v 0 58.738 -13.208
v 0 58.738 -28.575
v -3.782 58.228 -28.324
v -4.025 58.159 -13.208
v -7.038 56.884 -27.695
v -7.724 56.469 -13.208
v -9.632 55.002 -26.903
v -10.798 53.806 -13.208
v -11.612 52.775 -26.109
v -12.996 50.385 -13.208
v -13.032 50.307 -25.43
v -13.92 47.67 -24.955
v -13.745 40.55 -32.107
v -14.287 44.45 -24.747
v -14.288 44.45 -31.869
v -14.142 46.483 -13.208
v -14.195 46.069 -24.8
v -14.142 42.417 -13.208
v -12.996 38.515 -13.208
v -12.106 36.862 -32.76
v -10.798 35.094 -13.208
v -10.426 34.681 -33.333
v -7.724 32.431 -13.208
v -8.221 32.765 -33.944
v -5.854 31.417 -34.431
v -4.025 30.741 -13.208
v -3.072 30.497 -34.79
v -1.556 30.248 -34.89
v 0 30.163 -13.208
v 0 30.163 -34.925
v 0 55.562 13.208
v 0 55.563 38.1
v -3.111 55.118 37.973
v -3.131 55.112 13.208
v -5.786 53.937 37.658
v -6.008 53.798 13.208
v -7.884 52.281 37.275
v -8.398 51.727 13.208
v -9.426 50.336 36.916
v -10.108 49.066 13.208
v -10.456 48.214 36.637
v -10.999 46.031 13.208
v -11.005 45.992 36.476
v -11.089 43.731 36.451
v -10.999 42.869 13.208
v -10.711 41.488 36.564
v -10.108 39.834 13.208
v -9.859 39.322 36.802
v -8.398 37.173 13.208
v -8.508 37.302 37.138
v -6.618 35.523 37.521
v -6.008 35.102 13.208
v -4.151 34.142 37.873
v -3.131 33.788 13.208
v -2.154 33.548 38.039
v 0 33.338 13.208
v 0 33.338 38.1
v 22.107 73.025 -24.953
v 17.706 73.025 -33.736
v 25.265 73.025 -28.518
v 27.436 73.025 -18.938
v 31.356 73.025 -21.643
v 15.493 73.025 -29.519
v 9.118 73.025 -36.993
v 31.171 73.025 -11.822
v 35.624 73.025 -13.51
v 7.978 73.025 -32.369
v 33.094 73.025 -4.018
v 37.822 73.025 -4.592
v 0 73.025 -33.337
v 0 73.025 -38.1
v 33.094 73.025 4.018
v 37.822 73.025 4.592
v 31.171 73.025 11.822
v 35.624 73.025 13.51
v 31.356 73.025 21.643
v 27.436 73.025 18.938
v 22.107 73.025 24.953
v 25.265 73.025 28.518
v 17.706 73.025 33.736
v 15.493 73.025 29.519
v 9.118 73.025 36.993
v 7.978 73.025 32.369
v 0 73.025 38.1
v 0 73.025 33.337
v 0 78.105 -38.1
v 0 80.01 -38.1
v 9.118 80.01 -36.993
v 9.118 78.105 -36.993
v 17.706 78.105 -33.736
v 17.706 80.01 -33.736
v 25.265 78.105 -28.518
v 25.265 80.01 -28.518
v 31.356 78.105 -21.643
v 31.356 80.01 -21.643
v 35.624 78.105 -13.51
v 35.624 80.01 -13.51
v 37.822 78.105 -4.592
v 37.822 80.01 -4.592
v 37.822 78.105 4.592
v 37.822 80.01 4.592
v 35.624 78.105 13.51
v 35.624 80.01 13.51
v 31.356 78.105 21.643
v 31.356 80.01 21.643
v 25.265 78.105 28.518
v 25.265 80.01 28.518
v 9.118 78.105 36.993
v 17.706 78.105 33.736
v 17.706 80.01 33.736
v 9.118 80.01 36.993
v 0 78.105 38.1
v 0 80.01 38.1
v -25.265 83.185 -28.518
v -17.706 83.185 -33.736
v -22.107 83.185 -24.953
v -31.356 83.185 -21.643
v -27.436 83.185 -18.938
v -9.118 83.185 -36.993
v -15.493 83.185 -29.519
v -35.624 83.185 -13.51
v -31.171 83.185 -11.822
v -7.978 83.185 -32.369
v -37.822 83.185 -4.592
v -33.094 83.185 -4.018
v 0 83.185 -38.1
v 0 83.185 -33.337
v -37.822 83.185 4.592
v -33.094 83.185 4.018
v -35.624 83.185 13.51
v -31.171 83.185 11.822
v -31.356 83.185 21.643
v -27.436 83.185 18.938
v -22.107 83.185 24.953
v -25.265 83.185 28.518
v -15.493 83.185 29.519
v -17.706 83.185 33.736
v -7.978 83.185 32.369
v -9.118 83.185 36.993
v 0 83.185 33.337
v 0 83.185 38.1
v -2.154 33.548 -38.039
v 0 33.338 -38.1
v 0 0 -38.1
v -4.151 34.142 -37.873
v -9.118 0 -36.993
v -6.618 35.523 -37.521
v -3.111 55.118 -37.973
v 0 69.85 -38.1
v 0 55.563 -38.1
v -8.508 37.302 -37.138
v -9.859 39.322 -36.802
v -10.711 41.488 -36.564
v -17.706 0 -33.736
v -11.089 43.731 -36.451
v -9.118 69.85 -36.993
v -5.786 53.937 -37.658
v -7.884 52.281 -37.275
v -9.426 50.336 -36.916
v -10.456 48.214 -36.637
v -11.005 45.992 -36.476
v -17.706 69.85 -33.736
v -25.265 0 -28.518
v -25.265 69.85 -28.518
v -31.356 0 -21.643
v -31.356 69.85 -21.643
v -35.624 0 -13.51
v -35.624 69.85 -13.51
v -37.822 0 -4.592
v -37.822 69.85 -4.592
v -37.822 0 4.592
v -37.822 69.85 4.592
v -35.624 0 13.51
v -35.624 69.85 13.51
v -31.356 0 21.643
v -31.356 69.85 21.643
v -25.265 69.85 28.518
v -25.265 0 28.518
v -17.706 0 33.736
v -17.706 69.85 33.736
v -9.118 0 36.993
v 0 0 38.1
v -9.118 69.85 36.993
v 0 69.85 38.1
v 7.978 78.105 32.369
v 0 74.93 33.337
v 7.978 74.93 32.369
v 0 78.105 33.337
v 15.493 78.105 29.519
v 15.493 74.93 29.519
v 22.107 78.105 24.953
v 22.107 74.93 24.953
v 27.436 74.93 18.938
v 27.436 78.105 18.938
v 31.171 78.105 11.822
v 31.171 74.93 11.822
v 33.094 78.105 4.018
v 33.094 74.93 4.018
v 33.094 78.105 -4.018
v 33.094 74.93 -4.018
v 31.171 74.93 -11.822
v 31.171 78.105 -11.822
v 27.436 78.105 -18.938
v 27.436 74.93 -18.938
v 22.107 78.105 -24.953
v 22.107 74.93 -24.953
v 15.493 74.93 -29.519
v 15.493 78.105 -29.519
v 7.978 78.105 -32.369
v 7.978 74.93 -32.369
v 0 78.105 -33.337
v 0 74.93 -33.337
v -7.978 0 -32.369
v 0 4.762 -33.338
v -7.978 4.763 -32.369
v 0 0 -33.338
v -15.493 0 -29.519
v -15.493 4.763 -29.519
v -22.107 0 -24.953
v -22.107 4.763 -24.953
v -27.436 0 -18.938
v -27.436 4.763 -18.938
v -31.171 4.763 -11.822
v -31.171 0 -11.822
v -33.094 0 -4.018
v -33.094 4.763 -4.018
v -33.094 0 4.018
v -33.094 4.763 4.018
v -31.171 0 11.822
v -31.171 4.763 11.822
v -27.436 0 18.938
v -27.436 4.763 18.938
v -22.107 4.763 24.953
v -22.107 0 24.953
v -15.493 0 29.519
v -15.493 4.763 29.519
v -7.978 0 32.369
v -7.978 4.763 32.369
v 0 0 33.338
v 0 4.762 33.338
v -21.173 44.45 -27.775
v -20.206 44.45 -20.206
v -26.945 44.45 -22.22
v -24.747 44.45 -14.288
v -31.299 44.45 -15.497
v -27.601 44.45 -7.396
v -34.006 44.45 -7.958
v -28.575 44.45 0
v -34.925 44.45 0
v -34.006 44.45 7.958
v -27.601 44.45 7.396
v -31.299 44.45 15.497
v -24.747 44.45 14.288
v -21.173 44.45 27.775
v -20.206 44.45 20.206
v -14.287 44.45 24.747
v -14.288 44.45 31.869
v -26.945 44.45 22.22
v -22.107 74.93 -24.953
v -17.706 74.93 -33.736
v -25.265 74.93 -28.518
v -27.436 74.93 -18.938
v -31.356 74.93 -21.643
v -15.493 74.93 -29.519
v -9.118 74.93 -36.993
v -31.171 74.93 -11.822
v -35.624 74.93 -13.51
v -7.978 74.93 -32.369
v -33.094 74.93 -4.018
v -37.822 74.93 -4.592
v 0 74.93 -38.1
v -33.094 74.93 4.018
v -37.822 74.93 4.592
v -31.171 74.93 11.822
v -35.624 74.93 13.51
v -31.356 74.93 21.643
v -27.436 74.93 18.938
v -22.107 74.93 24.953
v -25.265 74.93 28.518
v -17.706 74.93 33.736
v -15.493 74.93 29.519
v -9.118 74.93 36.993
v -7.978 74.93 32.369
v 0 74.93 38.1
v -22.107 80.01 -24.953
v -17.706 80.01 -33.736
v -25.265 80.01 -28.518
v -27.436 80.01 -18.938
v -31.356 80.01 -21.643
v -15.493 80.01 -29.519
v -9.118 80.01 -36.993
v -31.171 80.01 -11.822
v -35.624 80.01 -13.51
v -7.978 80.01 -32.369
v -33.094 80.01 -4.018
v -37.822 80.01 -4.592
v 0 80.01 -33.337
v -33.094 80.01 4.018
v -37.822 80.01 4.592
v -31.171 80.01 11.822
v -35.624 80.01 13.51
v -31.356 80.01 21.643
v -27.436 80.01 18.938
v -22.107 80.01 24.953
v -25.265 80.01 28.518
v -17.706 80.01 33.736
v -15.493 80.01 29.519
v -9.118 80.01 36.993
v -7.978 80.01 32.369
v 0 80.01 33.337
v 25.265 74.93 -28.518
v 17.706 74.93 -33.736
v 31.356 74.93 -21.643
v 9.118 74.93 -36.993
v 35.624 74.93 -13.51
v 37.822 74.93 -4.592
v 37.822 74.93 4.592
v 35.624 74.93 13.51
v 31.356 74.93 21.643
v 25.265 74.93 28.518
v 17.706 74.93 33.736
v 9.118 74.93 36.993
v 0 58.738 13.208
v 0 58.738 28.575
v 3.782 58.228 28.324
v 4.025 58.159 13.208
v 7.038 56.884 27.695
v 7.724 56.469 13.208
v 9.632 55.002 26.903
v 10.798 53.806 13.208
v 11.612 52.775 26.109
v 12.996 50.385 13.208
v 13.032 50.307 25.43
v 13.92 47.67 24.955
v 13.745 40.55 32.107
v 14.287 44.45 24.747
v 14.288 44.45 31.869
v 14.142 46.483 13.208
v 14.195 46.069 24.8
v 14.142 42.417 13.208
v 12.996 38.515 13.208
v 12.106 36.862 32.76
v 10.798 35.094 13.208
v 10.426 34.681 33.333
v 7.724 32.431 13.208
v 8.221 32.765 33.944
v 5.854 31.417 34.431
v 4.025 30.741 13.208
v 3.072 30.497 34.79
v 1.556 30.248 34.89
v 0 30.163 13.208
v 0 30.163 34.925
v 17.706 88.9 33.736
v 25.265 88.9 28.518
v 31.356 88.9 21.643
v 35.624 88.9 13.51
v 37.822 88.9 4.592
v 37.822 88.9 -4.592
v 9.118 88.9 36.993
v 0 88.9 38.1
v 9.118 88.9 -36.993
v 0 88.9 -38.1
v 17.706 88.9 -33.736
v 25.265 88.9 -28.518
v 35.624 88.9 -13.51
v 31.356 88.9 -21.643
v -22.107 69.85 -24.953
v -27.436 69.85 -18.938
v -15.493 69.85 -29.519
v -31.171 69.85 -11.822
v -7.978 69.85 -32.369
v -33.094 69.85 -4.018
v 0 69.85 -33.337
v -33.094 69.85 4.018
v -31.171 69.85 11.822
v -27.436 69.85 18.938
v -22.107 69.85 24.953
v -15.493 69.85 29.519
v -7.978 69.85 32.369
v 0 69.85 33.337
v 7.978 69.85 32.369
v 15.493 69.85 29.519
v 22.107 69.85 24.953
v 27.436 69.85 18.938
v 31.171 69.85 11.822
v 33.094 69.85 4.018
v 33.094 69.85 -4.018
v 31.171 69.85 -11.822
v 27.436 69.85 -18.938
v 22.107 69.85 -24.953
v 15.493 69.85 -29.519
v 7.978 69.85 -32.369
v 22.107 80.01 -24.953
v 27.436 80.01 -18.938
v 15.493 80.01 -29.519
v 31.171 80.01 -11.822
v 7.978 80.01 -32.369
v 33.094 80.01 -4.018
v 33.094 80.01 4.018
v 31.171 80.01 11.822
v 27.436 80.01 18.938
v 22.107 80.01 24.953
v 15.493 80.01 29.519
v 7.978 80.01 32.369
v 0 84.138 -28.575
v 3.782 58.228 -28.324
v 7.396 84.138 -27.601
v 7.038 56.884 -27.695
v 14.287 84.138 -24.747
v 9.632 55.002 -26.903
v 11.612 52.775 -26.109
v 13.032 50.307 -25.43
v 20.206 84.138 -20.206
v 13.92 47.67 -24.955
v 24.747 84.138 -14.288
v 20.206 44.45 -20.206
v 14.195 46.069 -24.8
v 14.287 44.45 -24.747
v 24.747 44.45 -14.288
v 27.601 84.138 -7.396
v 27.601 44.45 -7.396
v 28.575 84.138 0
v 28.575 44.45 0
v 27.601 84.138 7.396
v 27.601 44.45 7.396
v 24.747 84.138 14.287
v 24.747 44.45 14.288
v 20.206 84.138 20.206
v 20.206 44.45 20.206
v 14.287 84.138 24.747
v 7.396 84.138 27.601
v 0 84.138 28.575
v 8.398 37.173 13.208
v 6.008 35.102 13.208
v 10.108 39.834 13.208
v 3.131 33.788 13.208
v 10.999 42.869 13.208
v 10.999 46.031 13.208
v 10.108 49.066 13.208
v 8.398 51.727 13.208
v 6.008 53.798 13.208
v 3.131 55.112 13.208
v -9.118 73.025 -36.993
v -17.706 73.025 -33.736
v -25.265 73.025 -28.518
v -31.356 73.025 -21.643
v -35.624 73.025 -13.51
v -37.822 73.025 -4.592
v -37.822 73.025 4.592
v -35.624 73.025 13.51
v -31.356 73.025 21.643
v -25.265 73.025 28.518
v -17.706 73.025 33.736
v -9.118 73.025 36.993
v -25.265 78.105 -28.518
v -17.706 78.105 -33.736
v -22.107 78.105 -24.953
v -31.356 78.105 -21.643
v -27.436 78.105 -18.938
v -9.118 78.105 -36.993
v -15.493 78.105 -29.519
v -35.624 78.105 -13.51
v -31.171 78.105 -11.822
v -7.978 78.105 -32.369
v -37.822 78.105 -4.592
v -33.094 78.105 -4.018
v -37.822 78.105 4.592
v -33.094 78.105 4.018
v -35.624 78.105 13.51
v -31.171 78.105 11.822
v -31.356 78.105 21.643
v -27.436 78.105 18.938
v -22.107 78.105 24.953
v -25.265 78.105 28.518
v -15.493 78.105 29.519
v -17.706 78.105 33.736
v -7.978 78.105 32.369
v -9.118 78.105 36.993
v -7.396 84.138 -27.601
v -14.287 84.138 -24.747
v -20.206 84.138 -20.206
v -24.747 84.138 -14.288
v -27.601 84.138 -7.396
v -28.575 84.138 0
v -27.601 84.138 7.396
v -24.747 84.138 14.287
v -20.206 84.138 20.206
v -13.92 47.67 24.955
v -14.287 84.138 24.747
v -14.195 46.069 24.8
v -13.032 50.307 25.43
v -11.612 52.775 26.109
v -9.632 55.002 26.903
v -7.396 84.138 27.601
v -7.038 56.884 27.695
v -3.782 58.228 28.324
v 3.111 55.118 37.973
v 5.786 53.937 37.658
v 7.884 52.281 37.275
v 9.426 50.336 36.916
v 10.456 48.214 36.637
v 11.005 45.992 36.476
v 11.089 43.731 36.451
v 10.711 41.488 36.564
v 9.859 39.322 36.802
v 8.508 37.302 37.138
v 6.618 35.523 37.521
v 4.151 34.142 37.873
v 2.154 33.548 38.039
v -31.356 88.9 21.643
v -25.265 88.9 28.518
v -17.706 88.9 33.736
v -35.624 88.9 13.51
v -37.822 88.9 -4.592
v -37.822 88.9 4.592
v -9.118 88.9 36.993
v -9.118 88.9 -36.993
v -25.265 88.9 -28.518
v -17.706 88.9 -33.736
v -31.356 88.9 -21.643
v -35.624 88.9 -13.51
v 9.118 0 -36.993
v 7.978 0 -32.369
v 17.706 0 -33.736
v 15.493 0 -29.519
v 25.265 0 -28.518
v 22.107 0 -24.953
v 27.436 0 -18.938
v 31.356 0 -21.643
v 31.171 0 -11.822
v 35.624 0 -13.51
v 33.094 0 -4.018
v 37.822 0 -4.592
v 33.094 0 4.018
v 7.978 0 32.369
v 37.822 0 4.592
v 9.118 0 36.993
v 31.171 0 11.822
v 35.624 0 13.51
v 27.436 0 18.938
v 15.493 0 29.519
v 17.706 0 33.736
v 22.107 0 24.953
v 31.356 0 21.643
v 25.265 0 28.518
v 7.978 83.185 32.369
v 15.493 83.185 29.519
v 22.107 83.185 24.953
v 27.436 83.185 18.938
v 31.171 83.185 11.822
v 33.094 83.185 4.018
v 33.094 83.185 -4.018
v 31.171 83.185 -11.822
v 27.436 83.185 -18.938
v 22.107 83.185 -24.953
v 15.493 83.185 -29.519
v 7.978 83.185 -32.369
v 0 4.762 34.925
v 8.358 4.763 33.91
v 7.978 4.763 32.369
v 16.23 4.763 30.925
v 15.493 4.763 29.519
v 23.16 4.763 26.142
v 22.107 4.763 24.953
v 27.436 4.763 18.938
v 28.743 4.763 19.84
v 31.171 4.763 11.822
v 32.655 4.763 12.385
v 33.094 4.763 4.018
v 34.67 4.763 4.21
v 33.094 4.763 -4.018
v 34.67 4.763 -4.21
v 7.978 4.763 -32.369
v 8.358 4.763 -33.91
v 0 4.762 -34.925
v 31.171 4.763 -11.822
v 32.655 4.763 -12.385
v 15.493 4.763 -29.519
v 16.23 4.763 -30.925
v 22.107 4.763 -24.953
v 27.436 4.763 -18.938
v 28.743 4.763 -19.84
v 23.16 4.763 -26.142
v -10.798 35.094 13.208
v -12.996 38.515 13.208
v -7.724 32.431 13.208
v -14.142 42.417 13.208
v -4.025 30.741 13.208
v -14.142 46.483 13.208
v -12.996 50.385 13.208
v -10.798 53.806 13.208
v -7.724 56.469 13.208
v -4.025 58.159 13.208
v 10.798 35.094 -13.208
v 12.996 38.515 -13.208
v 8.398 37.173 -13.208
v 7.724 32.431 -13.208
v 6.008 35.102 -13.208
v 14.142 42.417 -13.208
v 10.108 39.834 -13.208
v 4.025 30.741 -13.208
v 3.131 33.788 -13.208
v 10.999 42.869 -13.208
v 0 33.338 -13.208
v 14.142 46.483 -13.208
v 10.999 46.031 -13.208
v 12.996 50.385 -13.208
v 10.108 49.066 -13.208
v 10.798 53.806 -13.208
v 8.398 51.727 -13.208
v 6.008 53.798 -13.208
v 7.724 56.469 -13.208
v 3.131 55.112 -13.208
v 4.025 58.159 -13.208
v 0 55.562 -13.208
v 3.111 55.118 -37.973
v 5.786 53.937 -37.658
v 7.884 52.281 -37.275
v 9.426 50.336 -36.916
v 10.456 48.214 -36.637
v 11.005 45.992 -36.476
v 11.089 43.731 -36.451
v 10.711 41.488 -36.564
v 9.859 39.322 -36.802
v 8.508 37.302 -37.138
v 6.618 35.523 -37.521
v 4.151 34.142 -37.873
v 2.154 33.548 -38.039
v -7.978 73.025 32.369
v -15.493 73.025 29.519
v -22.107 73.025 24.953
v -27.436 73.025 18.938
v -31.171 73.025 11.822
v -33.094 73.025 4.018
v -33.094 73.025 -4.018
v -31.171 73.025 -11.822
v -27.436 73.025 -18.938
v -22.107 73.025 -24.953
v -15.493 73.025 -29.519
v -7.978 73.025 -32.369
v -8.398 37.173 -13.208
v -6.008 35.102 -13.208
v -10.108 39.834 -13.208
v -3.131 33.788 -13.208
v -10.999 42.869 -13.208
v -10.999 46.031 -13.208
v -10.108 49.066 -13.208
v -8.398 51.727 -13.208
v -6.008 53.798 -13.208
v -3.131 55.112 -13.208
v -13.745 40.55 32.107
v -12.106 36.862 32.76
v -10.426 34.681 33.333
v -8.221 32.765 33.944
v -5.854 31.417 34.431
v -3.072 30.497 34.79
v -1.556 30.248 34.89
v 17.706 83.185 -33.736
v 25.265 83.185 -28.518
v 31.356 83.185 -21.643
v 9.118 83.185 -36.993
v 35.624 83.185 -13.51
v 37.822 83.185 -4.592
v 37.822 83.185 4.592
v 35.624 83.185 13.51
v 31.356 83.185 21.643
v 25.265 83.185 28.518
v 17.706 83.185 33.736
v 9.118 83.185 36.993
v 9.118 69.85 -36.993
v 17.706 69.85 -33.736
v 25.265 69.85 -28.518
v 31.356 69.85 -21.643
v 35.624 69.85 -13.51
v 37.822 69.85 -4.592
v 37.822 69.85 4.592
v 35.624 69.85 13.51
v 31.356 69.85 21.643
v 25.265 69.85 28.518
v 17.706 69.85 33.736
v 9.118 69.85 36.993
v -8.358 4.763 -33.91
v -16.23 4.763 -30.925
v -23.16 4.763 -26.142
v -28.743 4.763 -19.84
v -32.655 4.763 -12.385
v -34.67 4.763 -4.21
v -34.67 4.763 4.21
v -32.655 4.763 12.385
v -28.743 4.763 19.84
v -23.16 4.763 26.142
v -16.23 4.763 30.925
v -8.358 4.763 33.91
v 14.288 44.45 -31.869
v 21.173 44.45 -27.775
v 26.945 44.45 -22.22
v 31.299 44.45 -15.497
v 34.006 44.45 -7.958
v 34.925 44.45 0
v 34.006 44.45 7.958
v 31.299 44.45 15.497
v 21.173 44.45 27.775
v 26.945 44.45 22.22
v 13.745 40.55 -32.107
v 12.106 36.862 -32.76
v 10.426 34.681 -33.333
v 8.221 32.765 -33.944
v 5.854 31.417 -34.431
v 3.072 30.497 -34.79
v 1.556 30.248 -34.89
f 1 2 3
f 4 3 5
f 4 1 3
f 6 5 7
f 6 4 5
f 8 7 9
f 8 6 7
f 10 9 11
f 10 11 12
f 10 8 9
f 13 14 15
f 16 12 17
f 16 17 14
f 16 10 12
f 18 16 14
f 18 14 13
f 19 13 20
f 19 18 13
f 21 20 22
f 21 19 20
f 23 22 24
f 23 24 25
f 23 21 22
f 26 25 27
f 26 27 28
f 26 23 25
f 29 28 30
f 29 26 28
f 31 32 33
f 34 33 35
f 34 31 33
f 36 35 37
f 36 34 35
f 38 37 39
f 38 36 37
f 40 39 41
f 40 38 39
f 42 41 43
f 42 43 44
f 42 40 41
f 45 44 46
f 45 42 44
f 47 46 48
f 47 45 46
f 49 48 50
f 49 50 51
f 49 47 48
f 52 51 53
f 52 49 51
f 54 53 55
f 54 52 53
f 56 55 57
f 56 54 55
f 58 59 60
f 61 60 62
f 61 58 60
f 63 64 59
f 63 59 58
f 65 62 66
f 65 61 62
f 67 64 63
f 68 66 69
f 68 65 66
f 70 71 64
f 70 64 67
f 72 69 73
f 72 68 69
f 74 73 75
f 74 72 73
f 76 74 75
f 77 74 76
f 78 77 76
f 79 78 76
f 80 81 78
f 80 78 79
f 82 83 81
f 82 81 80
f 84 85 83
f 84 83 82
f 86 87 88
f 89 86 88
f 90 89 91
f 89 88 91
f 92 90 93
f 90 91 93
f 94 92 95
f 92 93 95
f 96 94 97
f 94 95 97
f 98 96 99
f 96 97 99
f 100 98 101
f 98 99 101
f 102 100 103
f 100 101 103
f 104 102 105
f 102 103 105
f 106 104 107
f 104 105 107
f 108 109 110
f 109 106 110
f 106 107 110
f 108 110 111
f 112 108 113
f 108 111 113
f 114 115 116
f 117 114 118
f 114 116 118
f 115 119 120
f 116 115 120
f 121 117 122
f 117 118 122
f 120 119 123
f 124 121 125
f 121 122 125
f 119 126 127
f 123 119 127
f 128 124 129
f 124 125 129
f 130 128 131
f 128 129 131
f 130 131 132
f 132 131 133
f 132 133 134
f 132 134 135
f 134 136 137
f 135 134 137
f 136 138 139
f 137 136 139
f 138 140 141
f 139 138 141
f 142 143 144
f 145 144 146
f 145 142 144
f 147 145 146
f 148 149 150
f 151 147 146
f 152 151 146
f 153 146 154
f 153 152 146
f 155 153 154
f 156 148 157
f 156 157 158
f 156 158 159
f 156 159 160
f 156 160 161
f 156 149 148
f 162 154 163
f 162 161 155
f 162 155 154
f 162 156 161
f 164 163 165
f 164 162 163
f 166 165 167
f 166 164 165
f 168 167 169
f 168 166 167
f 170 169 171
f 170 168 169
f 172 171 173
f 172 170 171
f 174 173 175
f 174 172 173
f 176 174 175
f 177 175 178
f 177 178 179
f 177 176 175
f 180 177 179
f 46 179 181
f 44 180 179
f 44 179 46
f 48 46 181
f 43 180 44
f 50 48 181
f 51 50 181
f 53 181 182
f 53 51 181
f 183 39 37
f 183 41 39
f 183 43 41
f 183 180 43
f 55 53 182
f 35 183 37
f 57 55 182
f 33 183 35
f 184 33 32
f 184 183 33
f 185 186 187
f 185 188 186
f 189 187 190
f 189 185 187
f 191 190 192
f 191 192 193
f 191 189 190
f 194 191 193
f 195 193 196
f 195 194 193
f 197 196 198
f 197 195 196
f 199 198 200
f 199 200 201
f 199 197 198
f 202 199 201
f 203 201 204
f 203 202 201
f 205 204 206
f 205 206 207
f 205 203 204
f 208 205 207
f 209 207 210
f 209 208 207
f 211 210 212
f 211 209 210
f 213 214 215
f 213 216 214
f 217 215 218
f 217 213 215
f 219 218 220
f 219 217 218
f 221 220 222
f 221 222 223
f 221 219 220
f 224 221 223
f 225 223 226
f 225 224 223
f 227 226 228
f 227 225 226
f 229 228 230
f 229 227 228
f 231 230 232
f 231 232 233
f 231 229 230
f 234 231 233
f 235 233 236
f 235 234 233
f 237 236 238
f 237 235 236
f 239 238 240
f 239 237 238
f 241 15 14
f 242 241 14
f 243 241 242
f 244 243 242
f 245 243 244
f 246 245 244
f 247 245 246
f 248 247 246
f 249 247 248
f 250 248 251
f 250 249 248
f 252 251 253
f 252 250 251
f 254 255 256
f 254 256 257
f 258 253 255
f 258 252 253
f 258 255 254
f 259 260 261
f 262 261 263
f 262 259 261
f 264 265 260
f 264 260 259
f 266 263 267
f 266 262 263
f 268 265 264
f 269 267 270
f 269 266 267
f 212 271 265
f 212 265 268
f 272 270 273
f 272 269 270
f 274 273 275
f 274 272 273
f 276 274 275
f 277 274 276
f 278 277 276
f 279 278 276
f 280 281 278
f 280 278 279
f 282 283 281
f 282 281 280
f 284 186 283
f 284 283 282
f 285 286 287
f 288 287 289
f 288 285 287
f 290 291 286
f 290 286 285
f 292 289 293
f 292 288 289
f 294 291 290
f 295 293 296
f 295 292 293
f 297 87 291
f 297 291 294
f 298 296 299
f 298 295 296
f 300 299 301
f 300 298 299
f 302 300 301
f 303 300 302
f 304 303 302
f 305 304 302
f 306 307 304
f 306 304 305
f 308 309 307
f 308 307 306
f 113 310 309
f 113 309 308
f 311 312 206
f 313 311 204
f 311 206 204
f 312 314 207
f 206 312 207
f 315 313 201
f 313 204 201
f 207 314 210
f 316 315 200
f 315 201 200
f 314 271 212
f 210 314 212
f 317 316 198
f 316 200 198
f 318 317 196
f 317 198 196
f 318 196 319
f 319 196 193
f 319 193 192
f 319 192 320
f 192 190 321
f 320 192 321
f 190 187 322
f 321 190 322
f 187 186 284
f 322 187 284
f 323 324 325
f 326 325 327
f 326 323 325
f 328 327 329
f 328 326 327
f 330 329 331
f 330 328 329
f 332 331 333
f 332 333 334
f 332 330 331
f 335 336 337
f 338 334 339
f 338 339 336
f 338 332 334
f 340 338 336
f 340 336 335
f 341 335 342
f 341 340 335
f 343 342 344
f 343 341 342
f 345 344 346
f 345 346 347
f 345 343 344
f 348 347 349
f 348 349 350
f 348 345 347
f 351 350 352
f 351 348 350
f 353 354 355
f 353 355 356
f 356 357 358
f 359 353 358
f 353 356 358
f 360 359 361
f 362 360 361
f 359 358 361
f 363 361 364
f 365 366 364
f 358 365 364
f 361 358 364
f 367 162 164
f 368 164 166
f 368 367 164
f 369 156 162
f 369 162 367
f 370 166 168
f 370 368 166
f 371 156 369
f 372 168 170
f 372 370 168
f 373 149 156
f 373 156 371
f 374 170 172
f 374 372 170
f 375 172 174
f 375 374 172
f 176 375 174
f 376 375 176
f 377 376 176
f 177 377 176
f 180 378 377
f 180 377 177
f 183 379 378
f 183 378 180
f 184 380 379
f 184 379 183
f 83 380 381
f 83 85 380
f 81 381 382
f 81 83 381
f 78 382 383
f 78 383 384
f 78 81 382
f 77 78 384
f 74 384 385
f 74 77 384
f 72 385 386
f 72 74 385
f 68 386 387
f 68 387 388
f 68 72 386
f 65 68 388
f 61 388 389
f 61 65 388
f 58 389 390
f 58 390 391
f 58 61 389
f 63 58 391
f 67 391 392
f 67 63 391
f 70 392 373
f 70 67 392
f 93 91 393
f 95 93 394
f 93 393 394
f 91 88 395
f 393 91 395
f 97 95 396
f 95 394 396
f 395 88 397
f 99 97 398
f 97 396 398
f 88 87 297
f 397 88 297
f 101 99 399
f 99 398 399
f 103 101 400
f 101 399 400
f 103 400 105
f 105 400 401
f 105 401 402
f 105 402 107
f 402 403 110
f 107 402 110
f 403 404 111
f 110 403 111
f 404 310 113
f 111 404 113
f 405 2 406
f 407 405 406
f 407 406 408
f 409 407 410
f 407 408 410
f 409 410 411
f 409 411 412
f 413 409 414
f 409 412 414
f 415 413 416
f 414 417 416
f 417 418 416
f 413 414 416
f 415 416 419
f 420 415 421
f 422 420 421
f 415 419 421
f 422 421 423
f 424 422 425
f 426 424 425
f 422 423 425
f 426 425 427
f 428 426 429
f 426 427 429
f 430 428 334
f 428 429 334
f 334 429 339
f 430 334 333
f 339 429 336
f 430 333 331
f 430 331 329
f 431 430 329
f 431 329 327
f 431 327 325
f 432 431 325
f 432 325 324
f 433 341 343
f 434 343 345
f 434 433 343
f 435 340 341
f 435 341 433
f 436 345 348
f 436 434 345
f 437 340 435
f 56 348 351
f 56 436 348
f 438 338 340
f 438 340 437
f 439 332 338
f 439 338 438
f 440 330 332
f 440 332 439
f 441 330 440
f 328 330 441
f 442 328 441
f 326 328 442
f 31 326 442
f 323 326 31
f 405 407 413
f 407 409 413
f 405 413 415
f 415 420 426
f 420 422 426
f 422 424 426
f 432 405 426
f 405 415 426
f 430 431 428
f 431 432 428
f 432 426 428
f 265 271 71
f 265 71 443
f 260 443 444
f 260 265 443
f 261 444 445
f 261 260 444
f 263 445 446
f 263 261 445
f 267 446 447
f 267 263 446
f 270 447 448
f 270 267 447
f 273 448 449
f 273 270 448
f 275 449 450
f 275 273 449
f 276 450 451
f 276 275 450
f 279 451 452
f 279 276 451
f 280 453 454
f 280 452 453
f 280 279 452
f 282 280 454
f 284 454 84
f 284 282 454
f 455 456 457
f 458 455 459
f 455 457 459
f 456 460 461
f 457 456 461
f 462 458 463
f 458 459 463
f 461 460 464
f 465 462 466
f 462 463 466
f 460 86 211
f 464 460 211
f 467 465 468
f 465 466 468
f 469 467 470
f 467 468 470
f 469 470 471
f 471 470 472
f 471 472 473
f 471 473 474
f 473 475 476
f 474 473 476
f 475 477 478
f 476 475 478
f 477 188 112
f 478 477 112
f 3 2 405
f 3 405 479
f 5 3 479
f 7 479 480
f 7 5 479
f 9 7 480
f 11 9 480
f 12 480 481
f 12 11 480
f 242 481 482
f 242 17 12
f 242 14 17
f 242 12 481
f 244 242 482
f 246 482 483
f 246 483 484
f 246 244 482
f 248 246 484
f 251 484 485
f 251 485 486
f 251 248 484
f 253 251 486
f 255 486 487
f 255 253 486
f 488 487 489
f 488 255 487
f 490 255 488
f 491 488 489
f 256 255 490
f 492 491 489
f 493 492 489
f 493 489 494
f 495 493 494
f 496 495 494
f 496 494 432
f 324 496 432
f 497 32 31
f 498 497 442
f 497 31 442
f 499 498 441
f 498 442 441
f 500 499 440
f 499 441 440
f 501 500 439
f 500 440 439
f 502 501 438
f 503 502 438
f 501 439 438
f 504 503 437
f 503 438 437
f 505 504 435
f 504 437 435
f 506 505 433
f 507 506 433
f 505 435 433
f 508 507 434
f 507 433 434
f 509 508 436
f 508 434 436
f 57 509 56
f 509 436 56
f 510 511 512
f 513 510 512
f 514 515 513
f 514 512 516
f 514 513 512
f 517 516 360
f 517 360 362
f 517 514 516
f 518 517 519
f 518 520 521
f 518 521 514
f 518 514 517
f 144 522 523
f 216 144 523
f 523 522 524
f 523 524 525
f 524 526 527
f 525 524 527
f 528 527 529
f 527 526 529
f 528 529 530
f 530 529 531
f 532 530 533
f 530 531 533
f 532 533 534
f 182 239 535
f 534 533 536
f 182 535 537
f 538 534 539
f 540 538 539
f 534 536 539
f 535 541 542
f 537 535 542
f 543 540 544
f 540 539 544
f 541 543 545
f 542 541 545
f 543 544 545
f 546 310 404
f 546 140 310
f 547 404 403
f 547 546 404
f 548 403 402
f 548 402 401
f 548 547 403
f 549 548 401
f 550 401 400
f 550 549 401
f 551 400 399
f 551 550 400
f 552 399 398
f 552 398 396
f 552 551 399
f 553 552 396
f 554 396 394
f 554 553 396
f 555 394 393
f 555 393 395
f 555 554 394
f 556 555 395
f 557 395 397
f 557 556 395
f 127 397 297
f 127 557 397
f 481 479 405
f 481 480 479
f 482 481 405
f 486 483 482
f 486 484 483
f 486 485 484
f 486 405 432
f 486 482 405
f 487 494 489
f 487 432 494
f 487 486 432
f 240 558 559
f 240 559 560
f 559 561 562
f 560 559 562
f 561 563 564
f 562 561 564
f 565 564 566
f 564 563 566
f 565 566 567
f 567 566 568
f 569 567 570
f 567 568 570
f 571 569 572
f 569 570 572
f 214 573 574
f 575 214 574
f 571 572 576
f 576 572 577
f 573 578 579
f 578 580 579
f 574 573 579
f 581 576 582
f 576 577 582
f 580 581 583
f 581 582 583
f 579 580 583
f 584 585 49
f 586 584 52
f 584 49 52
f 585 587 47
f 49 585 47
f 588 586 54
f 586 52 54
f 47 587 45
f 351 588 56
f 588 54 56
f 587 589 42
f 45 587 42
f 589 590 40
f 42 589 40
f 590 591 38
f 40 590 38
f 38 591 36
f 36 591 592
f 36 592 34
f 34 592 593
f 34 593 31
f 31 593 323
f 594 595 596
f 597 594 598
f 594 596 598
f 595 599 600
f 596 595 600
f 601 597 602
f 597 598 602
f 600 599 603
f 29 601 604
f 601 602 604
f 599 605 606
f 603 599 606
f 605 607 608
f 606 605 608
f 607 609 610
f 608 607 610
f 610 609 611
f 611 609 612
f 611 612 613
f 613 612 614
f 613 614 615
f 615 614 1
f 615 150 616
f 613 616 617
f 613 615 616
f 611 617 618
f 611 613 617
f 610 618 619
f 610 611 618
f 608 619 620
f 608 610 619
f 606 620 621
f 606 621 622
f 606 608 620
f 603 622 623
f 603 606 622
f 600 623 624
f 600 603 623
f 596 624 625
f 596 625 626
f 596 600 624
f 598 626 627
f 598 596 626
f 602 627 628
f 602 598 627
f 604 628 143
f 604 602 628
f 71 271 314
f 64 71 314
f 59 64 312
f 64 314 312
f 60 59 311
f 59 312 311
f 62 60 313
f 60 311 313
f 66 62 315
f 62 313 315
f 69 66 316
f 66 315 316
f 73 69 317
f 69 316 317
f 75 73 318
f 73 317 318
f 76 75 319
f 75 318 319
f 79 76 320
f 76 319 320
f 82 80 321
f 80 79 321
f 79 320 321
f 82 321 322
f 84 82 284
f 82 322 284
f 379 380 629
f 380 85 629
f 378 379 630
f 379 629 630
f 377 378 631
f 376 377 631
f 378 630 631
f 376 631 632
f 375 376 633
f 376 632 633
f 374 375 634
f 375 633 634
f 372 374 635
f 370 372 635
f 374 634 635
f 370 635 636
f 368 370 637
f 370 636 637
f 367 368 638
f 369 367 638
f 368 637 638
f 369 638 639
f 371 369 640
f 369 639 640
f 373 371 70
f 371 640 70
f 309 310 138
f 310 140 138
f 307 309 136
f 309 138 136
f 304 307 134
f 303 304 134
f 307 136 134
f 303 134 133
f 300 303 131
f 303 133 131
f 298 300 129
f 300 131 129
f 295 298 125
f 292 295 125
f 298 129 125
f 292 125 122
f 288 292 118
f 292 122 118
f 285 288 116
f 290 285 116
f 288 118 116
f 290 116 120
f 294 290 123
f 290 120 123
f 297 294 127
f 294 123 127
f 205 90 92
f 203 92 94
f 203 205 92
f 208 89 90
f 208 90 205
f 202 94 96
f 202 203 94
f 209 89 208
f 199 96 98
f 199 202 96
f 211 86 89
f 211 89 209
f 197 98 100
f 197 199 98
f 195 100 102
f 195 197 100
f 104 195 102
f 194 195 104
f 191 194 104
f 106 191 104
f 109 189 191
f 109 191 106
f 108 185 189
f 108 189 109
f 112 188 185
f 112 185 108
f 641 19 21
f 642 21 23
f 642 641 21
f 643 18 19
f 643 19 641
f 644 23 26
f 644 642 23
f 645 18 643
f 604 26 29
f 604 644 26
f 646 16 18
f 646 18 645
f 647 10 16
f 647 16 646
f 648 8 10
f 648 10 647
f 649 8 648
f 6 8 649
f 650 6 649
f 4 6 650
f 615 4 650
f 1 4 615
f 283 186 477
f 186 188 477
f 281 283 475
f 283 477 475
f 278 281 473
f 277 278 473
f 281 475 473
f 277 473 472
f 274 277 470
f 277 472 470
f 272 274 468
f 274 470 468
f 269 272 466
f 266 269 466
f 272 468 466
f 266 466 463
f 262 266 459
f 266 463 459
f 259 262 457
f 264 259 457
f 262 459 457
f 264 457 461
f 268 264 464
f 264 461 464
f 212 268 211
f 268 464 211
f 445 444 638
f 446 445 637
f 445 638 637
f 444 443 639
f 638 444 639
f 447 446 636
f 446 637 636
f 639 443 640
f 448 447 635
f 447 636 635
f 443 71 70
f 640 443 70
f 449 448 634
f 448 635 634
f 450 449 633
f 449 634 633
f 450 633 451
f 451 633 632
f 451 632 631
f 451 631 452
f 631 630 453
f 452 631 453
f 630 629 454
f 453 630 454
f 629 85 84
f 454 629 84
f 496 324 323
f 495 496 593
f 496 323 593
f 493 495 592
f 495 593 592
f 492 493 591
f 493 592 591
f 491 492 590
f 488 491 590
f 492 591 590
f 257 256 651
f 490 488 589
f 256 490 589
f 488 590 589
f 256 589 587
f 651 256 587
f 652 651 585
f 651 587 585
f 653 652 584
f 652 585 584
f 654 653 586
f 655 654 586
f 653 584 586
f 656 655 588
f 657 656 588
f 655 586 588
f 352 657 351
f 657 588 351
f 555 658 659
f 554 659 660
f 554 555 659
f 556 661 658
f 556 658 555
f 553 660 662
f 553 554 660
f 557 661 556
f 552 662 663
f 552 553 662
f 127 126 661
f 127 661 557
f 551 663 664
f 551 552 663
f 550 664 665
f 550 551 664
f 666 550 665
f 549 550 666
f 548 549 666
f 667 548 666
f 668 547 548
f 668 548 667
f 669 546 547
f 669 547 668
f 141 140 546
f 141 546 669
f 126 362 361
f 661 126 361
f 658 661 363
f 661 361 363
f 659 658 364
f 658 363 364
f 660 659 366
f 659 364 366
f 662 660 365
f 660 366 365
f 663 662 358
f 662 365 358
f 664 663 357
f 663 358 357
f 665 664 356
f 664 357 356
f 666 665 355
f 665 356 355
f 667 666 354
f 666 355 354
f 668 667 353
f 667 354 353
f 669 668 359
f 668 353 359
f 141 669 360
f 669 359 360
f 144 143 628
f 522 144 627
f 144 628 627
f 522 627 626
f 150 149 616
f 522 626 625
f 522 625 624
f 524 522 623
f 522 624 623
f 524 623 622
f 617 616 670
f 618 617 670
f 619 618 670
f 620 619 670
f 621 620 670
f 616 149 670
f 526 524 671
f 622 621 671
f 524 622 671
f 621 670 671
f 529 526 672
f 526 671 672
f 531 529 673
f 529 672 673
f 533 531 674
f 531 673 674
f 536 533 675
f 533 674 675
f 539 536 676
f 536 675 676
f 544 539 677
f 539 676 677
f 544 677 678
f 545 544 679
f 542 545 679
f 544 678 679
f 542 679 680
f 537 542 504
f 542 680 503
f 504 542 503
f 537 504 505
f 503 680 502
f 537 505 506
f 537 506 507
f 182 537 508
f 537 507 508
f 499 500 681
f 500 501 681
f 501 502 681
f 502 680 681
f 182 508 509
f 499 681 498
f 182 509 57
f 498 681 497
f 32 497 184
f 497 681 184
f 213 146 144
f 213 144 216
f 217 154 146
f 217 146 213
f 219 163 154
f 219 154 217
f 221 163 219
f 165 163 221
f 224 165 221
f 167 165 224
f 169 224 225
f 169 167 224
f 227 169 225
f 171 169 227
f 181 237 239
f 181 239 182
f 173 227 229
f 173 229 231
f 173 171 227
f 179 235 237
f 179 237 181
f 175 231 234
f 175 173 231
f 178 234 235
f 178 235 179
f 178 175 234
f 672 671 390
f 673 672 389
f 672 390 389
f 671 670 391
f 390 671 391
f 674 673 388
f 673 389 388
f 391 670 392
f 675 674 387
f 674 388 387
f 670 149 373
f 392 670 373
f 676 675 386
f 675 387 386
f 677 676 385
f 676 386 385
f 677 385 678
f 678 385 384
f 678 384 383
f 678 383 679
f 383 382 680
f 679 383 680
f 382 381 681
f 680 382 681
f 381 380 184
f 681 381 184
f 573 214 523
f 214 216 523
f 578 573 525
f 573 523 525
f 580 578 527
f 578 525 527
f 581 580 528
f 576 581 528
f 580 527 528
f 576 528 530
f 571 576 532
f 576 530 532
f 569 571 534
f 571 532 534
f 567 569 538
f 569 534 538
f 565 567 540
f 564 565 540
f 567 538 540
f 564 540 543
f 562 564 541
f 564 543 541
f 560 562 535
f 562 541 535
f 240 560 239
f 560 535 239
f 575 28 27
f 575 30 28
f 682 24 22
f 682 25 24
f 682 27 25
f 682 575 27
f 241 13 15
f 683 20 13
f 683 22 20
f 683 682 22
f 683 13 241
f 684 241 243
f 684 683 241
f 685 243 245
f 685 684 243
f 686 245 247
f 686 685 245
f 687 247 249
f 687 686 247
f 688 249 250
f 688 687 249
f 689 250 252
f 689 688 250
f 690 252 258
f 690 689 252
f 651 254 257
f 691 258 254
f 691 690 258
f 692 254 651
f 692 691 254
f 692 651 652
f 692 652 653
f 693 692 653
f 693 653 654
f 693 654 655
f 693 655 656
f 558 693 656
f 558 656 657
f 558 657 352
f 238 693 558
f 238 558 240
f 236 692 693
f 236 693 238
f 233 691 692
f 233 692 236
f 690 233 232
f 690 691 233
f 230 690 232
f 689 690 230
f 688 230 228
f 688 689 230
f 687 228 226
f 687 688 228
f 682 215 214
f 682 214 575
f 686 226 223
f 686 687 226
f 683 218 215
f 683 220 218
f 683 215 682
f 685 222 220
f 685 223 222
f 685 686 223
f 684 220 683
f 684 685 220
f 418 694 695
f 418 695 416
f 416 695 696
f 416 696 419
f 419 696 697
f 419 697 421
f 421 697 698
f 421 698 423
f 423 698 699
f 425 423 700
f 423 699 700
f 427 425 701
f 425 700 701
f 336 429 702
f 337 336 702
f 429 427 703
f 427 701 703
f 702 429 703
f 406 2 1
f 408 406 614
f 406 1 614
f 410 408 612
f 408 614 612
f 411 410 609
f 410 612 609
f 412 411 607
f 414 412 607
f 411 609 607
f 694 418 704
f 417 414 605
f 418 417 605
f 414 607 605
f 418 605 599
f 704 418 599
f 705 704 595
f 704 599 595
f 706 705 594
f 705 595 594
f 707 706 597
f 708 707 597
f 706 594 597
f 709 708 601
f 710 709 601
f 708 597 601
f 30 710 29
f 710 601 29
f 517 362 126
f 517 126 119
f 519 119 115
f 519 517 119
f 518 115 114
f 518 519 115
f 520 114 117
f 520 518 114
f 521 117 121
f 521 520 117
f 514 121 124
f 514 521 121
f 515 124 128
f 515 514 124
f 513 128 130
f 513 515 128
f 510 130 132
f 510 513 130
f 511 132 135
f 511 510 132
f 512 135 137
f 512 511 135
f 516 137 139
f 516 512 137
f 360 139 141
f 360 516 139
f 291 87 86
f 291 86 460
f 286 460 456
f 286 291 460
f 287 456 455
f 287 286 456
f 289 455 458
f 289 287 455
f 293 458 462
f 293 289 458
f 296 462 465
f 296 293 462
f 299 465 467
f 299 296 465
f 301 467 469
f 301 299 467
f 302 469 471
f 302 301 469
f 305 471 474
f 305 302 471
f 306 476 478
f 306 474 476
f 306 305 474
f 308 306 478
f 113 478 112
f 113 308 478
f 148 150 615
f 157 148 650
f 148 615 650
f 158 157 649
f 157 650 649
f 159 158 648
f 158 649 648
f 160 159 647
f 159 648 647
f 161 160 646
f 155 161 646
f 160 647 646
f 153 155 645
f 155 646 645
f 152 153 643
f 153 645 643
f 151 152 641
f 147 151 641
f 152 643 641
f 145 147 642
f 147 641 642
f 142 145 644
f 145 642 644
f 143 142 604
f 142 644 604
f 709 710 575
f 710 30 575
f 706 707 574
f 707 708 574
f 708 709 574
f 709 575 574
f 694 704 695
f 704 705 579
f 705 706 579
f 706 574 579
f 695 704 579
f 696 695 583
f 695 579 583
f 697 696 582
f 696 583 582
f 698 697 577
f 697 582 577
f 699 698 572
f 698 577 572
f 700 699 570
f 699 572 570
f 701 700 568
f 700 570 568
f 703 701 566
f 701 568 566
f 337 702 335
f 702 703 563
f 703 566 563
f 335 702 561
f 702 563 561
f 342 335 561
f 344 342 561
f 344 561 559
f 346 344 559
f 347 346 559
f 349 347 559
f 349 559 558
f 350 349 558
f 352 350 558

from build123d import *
from build123d.topology import SkipClean

# Parameters (mm, degrees)
MAIN_ANGLE          = 180
CIRCULAR_BOSS_REACH = 111.487
SKETCH6_R           = 11.1125
CIRCULAR_CUT_DEPTH  = 110.4866698
SKETCH7_W           = 4.7625
SKETCH7_H           = 3.175
LPATTERN1_COUNT     = 3
LPATTERN1_PITCH     = 5.08


with BuildPart() as part:
    # Sketch1 → Main (revolve)
    with BuildSketch(Plane(origin=(0, 0, 0), x_dir=(0, 0, -1), z_dir=(1, 0, 0))):
        Polygon((38.1, 88.9), (0, 88.9), (0, 84.1375), (28.575, 84.1375), (28.575, 44.45), (34.925, 44.45), (34.925, 4.7625), (33.3375, 4.7625), (33.3375, 0), (38.1, 0), align=None)
    revolve(axis=Axis((0, 88.9, 0), (0, 1, 0)), revolution_arc=MAIN_ANGLE)

    # Sketch5 → Circular Boss (add, up to next)
    with BuildSketch(Plane.XY.offset(13.208), mode=Mode.PRIVATE) as circular_boss_sk1:
        with BuildLine():
            Line((0, 30.1625), (0, 58.7375))
            ThreePointArc((0, 58.7375), (-14.2875, 44.45), (0, 30.1625))
        make_face()
    circular_boss_tool1 = extrude(circular_boss_sk1.sketch, amount=CIRCULAR_BOSS_REACH, mode=Mode.PRIVATE) - part.part
    circular_boss = circular_boss_tool1.solids().sort_by_distance((-6.063803, 44.45, 13.208))[0]
    add(circular_boss)

    # Sketch6 → Circular Cut (cut, through all)
    with BuildSketch(Plane.XY.offset(13.208)):
        with Locations((0, 44.45)):
            Circle(SKETCH6_R)
    circular_cut = extrude(amount=CIRCULAR_CUT_DEPTH, mode=Mode.SUBTRACT)

    # Sketch7 → Cut-Revolve1 (revolve, cut)
    with BuildSketch(Plane(origin=(0, 7.447290845, 55.242674731), x_dir=(0, 0, -1), z_dir=(1, 0, 0))):
        with Locations((90.961424731, 63.990209155)):
            Rectangle(SKETCH7_W, SKETCH7_H)
    cut_revolve1 = revolve(axis=Axis((0, 73.025, 0), (0, -1, 0)), mode=Mode.SUBTRACT)

    # LPattern1: Cut-Revolve1 ×3
    with Locations(*[(0, i * LPATTERN1_PITCH, 0) for i in range(1, LPATTERN1_COUNT)]):
        add(cut_revolve1, mode=Mode.SUBTRACT)

    # Mirror1: Circular Boss, Circular Cut across plane
    add(circular_boss.mirror(Plane.XY))
    add(circular_cut.mirror(Plane.XY), mode=Mode.SUBTRACT)

    # Mirror2: part across face


with BuildPart() as part_1:
    with SkipClean():  # the faces are left unmerged after this step: merging them gives an invalid solid
        add(part.part)
        add(part.part.mirror(Plane(origin=(0, 74.450038597, 0), x_dir=(0, 0, 1), z_dir=(1, 0, 0))))


solid = part_1.part
